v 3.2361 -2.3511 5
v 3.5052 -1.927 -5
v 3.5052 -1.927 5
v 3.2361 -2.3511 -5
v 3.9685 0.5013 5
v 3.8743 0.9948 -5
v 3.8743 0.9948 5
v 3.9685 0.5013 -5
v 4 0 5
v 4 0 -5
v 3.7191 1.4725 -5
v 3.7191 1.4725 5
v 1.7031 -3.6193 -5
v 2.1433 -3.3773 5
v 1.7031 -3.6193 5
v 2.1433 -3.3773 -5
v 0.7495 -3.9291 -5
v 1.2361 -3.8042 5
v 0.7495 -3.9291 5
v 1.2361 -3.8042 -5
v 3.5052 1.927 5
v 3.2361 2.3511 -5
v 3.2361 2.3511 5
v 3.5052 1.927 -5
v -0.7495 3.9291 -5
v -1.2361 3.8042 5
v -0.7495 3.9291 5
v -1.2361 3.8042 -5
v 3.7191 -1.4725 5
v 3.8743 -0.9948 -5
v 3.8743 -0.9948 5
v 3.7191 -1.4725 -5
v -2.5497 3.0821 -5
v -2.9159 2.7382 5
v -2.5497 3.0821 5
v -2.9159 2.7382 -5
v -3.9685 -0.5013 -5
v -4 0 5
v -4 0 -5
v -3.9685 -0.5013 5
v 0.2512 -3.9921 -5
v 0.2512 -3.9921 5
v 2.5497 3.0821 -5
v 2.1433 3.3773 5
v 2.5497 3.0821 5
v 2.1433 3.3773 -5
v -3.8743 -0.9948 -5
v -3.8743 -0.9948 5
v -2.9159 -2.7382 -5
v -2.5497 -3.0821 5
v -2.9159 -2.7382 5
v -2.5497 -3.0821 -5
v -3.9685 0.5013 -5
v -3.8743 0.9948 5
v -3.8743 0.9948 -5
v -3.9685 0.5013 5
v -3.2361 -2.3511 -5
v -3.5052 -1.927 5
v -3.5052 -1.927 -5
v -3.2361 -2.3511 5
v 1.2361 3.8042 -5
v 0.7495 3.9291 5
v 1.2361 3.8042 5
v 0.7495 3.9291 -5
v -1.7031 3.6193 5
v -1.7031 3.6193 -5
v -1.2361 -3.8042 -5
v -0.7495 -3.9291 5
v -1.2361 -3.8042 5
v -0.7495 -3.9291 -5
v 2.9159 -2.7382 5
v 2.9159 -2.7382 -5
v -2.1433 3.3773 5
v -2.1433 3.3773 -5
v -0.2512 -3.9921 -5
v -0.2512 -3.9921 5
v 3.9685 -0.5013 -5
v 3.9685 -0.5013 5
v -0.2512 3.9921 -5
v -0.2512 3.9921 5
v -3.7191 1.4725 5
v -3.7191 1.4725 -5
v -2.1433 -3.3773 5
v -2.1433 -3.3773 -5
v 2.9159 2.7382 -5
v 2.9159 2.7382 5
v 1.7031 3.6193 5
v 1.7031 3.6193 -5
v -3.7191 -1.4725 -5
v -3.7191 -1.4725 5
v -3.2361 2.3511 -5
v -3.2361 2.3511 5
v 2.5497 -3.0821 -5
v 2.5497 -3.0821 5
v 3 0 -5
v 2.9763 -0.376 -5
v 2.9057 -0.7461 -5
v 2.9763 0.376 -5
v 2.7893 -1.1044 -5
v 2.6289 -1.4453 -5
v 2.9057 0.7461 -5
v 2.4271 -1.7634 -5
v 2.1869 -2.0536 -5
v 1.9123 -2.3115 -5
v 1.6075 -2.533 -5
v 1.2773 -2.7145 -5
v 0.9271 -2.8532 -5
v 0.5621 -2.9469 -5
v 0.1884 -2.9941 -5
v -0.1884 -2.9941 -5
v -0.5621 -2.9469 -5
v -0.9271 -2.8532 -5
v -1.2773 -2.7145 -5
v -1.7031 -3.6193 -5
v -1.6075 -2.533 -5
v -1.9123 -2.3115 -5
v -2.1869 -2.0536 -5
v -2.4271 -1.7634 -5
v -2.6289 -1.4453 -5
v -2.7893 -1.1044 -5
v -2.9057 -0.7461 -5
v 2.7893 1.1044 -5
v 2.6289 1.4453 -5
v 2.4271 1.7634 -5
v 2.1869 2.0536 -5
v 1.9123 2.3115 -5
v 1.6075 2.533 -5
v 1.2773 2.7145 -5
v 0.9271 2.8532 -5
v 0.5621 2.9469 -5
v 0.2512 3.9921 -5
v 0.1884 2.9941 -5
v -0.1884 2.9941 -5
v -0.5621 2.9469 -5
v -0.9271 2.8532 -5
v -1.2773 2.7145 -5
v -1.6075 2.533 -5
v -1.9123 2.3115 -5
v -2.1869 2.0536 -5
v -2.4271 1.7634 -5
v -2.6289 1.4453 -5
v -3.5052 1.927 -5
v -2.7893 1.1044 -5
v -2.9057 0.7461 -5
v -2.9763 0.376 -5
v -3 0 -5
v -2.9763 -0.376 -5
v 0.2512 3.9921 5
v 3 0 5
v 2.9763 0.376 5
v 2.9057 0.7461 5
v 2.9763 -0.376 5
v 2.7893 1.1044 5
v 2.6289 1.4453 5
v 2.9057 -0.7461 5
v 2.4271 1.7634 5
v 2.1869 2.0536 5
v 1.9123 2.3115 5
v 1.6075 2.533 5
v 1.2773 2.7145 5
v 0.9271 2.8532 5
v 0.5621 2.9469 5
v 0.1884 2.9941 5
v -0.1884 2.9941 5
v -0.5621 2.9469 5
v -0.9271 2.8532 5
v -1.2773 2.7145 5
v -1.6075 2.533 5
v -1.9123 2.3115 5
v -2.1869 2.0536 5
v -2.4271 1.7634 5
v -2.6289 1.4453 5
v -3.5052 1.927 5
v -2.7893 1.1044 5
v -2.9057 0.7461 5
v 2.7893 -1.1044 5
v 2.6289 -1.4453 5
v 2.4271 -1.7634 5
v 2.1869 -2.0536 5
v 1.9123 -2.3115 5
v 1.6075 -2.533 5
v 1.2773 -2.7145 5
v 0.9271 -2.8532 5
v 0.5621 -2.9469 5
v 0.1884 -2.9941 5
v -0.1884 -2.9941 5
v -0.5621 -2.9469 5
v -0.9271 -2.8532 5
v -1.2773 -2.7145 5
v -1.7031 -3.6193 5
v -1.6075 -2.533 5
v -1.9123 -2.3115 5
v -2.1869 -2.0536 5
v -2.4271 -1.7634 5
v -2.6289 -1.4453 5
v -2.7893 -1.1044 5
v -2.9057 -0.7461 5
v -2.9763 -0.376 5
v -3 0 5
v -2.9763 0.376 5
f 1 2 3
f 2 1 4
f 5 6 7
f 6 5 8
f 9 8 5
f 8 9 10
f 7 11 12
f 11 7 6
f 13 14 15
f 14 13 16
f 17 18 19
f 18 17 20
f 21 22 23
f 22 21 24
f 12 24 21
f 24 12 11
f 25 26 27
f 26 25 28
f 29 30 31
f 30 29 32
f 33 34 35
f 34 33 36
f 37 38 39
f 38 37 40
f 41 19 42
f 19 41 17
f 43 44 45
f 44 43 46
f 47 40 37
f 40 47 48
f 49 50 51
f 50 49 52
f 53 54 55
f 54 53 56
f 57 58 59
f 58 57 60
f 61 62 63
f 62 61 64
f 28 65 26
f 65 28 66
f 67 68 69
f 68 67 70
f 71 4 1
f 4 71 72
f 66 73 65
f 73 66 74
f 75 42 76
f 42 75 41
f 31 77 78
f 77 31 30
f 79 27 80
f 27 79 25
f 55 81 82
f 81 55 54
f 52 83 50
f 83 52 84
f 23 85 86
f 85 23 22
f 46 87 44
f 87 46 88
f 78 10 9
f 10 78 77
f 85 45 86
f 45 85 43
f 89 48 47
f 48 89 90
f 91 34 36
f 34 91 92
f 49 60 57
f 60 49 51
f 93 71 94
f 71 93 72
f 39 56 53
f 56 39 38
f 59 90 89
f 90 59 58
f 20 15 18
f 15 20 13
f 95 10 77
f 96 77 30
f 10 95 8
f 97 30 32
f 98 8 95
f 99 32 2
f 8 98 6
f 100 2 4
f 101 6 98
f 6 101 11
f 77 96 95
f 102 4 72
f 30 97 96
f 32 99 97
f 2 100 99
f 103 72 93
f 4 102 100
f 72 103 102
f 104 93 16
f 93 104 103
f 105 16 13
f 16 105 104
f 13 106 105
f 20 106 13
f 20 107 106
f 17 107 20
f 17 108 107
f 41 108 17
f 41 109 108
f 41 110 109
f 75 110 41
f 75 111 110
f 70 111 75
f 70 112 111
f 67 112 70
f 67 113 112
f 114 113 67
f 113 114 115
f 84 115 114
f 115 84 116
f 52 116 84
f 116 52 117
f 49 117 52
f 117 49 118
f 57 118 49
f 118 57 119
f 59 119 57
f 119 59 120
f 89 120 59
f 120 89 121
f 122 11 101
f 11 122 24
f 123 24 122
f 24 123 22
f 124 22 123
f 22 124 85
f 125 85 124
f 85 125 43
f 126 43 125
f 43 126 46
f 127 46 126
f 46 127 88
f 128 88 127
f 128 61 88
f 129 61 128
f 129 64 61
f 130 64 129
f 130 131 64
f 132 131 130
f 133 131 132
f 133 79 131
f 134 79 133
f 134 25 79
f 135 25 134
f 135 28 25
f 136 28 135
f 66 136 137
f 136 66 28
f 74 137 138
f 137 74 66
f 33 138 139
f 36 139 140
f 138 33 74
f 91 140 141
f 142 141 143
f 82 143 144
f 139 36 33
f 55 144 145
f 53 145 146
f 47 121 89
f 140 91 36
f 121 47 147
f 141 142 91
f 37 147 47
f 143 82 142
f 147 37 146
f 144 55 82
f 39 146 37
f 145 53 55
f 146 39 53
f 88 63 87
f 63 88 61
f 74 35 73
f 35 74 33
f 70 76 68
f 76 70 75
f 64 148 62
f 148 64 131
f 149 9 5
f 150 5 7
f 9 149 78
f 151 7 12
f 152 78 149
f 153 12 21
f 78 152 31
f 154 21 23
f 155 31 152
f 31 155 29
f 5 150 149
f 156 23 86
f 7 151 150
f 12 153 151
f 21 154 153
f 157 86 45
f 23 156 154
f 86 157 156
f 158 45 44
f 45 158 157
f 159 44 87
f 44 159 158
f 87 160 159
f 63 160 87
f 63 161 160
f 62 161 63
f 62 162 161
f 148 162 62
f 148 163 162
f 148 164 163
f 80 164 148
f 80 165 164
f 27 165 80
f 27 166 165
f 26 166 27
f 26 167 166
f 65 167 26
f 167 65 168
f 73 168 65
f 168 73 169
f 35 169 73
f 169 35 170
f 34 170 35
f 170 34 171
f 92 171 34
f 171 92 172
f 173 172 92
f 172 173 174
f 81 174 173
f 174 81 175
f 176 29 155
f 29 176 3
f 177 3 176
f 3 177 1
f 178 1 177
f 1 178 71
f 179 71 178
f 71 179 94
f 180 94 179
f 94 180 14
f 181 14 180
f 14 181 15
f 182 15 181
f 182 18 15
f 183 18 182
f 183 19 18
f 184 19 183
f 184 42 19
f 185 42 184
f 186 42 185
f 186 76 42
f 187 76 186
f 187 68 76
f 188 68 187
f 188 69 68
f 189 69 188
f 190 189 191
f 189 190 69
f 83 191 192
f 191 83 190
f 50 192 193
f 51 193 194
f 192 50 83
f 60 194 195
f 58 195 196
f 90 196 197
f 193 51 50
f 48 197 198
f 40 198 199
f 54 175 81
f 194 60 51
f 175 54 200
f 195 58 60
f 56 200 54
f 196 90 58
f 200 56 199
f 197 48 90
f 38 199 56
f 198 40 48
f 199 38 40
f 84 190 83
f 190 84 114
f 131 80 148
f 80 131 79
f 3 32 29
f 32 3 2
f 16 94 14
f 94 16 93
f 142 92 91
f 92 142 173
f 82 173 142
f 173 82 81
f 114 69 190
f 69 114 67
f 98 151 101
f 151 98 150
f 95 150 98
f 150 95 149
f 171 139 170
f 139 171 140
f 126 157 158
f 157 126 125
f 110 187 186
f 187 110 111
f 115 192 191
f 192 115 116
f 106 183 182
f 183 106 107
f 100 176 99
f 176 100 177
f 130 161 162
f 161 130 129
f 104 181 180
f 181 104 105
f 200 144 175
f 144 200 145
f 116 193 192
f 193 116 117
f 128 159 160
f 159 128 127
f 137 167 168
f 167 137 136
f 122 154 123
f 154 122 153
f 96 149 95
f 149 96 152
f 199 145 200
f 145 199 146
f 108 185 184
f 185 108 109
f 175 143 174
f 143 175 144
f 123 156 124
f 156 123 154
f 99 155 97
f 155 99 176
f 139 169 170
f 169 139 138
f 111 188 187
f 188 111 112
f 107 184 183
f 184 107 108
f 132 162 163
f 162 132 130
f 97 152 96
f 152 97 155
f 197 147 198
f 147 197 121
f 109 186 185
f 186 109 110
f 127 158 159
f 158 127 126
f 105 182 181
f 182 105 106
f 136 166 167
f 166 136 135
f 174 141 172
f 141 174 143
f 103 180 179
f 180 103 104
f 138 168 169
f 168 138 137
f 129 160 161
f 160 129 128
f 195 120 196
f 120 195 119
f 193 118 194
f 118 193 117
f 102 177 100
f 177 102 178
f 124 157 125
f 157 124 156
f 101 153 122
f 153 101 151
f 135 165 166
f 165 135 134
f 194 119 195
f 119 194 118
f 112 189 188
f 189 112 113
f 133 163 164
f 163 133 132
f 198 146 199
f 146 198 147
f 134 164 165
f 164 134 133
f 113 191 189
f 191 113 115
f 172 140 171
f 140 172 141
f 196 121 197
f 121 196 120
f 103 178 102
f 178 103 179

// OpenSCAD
$fn = 50;


difference() {
	union() {
		translate(v = [0, 0, -5.0000000000]) {
			cylinder(h = 10, r = 4.0000000000);
		}
	}
	union() {
		translate(v = [0, 0, -100.0000000000]) {
			cylinder(h = 200, r = 3.0000000000);
		}
	}
}
